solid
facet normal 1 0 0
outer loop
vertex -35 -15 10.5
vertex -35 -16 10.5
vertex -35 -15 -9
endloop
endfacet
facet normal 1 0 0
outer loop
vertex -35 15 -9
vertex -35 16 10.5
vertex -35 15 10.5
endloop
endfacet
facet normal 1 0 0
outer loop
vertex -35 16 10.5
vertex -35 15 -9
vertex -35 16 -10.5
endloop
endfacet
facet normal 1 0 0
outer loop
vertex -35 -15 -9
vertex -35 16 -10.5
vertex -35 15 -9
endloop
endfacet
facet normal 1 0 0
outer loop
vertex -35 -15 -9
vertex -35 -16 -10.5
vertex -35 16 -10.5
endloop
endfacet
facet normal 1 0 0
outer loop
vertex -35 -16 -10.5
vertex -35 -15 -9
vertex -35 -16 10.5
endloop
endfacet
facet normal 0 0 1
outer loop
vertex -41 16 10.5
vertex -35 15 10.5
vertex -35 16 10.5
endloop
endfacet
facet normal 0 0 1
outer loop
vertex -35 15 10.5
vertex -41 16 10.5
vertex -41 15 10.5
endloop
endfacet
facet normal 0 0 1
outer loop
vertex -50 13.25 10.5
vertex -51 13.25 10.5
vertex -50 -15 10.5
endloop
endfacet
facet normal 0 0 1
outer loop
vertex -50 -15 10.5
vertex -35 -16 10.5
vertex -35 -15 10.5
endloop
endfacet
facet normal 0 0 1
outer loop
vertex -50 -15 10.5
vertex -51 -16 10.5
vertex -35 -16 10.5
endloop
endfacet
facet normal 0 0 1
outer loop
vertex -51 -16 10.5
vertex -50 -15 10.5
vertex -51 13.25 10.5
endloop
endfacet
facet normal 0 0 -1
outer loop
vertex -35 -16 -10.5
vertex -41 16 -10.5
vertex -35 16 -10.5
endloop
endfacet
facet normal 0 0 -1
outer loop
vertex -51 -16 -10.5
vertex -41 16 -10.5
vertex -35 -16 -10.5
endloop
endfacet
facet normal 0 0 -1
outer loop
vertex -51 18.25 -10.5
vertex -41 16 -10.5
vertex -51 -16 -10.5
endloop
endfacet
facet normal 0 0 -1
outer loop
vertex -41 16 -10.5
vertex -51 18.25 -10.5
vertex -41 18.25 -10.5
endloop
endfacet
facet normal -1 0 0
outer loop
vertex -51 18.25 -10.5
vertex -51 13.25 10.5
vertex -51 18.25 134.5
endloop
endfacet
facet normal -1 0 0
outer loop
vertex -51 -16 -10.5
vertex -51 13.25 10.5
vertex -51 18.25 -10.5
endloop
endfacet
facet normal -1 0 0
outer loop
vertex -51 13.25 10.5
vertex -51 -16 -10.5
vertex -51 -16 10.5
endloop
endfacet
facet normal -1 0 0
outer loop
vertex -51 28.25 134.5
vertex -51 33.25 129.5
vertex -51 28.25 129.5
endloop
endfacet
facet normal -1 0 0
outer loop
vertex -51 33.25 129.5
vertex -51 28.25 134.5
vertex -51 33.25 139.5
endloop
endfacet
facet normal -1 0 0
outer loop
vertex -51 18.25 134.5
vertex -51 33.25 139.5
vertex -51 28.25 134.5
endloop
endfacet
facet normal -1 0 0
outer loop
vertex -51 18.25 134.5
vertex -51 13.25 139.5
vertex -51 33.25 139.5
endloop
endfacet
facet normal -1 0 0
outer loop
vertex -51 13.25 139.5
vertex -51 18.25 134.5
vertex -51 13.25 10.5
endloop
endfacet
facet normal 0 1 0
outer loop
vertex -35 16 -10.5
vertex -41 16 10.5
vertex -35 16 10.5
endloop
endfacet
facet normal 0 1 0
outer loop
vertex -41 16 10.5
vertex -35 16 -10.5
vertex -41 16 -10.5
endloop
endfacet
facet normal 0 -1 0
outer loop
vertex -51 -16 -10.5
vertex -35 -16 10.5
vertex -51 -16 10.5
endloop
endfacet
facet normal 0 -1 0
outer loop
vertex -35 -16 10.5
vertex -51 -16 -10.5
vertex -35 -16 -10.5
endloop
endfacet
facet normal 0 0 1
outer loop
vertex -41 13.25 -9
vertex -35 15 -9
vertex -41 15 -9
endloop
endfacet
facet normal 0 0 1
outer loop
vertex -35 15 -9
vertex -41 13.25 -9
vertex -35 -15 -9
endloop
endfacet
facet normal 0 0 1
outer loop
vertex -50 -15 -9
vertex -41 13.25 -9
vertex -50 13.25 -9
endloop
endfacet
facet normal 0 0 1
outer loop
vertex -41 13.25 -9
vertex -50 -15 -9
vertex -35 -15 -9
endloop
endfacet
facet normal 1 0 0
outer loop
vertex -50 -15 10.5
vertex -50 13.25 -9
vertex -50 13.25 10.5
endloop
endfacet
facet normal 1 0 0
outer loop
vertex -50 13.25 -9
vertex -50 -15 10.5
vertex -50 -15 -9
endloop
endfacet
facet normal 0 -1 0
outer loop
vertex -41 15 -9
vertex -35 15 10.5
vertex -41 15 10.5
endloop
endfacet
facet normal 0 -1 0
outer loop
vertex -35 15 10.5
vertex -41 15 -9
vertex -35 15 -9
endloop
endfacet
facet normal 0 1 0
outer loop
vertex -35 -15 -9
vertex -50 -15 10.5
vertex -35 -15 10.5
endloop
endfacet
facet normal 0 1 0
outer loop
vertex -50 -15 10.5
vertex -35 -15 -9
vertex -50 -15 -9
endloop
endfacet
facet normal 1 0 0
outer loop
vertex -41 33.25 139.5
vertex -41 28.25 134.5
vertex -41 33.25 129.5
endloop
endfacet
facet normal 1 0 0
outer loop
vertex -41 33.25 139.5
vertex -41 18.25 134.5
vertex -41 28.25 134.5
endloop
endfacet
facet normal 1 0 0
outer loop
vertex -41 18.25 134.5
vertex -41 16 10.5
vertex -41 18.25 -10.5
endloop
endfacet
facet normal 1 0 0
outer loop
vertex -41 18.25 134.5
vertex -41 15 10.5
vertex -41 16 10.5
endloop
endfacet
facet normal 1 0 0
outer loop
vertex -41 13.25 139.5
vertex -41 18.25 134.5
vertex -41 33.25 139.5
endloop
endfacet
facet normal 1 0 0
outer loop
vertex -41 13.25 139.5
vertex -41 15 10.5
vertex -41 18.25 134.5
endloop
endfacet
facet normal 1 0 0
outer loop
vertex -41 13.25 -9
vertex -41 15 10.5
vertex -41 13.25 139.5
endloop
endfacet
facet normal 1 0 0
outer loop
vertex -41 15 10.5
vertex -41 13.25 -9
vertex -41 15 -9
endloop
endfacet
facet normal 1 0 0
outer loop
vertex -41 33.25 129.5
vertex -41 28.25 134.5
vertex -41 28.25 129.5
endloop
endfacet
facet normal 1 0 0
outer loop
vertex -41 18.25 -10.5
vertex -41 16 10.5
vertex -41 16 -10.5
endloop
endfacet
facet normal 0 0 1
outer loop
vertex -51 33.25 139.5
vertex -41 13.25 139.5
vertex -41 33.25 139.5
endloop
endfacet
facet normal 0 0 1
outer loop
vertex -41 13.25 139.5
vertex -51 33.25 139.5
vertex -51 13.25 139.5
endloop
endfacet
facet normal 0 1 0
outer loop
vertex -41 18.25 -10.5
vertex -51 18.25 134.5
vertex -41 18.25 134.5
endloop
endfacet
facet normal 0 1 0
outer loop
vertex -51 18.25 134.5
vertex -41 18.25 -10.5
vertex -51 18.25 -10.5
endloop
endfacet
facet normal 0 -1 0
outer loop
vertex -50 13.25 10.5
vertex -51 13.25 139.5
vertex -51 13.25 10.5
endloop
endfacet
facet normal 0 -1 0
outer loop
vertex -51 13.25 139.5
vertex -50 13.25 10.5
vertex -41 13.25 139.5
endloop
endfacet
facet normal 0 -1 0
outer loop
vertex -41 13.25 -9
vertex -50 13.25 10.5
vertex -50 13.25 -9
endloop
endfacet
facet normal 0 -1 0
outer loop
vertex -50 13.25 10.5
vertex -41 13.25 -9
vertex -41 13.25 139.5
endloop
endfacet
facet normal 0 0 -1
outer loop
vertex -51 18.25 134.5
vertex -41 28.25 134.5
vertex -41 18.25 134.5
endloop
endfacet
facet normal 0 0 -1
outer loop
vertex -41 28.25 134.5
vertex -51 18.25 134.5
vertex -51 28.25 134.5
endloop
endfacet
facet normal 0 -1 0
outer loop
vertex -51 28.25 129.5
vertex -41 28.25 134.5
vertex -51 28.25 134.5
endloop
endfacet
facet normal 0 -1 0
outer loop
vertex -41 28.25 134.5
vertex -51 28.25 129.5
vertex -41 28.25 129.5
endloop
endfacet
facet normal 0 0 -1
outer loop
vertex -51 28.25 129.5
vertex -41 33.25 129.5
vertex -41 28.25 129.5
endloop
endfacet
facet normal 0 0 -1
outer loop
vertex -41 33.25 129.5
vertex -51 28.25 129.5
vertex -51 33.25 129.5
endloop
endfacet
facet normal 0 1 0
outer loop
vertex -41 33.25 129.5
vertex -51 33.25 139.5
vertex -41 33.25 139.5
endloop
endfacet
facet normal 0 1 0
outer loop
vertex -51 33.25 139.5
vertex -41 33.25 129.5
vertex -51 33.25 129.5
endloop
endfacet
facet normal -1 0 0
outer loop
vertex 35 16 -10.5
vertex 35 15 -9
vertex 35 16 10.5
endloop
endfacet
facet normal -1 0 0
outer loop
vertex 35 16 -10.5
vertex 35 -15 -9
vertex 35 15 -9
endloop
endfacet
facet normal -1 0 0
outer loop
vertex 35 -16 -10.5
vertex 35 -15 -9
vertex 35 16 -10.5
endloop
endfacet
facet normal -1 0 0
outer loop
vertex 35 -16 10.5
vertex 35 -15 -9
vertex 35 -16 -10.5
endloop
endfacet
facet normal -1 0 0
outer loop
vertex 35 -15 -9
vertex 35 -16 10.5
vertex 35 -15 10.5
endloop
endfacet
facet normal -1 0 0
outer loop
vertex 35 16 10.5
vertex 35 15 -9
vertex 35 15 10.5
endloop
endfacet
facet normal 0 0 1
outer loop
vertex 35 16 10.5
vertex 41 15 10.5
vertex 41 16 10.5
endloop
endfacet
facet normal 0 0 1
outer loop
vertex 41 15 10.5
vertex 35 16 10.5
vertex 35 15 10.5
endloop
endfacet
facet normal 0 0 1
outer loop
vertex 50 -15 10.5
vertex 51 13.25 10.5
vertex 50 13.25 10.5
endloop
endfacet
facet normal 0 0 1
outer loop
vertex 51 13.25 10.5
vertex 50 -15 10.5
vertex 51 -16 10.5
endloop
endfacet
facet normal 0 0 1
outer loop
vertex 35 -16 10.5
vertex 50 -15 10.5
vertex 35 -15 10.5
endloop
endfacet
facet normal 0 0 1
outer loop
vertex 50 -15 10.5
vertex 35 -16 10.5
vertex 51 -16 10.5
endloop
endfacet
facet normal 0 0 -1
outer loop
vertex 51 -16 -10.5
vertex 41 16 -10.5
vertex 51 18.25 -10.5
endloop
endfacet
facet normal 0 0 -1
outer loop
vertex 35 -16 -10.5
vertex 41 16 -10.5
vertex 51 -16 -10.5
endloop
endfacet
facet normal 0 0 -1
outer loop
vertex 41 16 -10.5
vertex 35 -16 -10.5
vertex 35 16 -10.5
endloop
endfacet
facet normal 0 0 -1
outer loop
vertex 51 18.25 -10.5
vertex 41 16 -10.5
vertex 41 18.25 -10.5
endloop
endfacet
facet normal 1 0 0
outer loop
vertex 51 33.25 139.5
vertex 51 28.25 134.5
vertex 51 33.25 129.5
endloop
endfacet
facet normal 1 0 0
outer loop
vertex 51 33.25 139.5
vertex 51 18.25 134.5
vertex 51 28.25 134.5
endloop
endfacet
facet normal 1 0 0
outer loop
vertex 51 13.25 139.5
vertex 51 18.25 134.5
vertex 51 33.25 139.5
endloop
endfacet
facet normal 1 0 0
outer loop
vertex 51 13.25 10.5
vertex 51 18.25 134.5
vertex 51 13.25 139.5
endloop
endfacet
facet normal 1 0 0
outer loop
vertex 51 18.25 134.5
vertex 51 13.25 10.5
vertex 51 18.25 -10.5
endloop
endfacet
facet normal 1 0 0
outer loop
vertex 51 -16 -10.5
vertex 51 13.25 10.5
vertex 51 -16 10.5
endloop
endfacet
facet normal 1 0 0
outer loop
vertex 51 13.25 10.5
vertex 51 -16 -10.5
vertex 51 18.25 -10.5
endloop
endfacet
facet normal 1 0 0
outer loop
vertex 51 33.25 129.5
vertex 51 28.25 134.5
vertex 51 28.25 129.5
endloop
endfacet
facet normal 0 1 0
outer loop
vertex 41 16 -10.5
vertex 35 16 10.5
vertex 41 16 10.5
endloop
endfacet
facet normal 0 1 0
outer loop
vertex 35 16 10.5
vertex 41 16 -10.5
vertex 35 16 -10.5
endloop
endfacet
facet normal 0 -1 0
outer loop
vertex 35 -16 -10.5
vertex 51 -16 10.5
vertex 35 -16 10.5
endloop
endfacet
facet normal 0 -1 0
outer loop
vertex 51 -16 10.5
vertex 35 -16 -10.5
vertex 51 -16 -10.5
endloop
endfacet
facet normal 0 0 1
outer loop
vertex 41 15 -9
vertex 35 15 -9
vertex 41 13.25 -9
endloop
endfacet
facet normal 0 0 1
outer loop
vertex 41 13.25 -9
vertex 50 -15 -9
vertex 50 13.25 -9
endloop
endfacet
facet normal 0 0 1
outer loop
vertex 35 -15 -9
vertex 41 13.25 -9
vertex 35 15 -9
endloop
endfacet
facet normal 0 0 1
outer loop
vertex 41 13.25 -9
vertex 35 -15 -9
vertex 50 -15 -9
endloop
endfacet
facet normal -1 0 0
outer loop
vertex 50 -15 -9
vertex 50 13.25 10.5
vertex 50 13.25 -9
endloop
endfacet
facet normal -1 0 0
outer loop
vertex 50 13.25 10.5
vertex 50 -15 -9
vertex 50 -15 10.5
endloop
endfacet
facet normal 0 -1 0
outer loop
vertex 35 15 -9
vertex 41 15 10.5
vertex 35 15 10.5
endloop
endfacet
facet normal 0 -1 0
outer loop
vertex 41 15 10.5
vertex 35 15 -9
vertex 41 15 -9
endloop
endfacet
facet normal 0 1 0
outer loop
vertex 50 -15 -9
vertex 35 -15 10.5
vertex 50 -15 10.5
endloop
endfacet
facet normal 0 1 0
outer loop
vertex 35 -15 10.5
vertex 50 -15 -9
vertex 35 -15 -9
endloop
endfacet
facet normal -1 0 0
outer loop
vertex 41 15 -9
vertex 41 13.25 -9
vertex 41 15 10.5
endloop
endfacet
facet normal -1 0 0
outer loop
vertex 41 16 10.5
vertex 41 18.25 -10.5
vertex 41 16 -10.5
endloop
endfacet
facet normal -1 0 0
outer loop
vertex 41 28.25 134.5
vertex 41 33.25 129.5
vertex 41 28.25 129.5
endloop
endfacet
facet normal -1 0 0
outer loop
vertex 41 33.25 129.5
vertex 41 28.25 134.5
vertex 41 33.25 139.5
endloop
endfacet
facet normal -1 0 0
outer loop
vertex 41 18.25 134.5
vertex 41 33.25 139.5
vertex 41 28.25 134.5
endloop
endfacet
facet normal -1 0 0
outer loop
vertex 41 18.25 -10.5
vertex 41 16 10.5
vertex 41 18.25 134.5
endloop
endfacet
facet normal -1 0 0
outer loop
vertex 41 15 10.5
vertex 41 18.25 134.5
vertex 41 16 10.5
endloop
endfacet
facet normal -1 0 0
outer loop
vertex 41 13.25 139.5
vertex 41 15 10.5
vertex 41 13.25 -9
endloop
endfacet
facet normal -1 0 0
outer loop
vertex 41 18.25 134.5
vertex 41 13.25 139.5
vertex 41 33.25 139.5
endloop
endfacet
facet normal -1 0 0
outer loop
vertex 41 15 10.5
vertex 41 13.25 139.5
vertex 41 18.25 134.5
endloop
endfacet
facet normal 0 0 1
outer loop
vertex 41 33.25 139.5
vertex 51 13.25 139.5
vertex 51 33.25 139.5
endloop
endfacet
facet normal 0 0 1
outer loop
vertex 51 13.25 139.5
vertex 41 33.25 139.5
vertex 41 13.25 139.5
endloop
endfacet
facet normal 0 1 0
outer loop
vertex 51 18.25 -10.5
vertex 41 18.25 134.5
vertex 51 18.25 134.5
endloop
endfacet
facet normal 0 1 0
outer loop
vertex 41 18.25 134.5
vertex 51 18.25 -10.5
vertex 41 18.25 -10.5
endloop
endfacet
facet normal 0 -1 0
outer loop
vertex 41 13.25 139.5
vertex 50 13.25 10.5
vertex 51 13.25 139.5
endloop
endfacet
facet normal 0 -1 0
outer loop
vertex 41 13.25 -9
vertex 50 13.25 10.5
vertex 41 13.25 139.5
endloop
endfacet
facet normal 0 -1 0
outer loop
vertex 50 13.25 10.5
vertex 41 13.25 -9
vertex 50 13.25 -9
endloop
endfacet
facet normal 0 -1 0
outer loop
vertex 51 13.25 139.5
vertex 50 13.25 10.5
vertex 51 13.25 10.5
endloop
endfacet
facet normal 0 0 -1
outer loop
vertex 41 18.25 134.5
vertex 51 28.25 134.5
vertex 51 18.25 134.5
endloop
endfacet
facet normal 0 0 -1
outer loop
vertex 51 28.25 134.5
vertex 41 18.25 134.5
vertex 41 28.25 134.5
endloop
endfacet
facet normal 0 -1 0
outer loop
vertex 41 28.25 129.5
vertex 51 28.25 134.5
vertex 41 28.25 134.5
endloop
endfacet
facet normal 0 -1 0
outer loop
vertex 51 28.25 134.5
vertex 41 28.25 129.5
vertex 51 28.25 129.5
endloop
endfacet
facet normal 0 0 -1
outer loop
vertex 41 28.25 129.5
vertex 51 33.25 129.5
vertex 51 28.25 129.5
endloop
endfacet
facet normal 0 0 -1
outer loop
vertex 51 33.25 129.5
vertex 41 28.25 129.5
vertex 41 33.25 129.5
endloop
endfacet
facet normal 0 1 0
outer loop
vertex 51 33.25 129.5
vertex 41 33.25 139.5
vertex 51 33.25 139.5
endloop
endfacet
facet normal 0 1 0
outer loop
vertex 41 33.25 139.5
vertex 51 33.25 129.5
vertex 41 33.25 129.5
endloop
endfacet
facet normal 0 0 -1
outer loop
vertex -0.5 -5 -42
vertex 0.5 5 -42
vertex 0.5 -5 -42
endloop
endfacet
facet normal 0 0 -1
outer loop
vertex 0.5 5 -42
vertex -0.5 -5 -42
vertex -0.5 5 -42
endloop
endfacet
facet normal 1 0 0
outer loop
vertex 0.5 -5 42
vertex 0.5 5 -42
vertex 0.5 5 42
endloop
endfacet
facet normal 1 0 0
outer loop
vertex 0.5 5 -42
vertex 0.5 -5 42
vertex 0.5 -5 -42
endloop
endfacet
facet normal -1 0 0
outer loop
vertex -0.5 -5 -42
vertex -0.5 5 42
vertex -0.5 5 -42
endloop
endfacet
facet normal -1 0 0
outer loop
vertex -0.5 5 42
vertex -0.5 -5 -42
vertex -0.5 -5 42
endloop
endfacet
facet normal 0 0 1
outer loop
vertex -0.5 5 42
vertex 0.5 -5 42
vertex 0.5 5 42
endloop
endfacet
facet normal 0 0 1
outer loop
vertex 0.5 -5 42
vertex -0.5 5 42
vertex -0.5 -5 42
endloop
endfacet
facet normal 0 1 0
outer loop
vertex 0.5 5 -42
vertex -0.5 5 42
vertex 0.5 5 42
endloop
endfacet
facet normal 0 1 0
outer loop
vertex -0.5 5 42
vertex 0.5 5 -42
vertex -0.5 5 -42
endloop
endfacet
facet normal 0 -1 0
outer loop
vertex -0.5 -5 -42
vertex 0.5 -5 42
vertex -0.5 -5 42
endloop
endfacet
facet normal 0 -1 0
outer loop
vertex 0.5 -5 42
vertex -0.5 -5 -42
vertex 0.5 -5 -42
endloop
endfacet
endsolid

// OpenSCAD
mdick=1;
schale_tiefe    = 30;
schale_breite   = 15;
schale_hoehe    = 20;

radio_tiefe     = 40;
radio_breite    = 100;
radio_hoehe     = 187;

steg_tiefe      = 5;
steg_breite     = 10;
steg_hoehe      = 150;

glasdicke       = 10;
haken_hoehe     = 10;


module schale() {
    difference() {
        cube([schale_breite + 1 * mdick,
              schale_tiefe + 2 * mdick,
              schale_hoehe + 1 * mdick], true);
        translate([mdick * 1.5, 0, mdick * 1.0])
            cube([schale_breite + 2 * mdick, schale_tiefe, schale_hoehe], true);
    }
}

module steg() {
    union() {
        cube([steg_breite, steg_tiefe, steg_hoehe],true);
        translate([0, steg_tiefe / 2  + glasdicke / 2, steg_hoehe / 2 - steg_tiefe / 2])
            cube([steg_breite, glasdicke, steg_tiefe],true);
        translate([0, steg_tiefe + glasdicke, steg_hoehe / 2 - haken_hoehe/2])
            cube([steg_breite, steg_tiefe, haken_hoehe],true);
    }
}


module halterseite() {
    schale();
    translate([-(schale_breite/2 - steg_breite / 2 + mdick / 2),
                schale_tiefe/2 + mdick * 0.75,
                steg_hoehe/2 - schale_hoehe / 2 - mdick / 2])
        steg();
}
module haltestreifen() {
    cube([radio_breite + 2 * mdick - (2 * steg_breite) + 2,
          steg_breite,
          mdick], true);
}

translate([-(radio_breite / 2 - schale_breite / 2 + mdick / 2),0,0]) halterseite();
translate([+(radio_breite / 2 - schale_breite / 2 + mdick / 2),0,0]) mirror([1,0,0]) halterseite();
rotate([0,90,0]) haltestreifen();


*translate([0,0,0]) cube([radio_breite, radio_tiefe, radio_hoehe], true);
